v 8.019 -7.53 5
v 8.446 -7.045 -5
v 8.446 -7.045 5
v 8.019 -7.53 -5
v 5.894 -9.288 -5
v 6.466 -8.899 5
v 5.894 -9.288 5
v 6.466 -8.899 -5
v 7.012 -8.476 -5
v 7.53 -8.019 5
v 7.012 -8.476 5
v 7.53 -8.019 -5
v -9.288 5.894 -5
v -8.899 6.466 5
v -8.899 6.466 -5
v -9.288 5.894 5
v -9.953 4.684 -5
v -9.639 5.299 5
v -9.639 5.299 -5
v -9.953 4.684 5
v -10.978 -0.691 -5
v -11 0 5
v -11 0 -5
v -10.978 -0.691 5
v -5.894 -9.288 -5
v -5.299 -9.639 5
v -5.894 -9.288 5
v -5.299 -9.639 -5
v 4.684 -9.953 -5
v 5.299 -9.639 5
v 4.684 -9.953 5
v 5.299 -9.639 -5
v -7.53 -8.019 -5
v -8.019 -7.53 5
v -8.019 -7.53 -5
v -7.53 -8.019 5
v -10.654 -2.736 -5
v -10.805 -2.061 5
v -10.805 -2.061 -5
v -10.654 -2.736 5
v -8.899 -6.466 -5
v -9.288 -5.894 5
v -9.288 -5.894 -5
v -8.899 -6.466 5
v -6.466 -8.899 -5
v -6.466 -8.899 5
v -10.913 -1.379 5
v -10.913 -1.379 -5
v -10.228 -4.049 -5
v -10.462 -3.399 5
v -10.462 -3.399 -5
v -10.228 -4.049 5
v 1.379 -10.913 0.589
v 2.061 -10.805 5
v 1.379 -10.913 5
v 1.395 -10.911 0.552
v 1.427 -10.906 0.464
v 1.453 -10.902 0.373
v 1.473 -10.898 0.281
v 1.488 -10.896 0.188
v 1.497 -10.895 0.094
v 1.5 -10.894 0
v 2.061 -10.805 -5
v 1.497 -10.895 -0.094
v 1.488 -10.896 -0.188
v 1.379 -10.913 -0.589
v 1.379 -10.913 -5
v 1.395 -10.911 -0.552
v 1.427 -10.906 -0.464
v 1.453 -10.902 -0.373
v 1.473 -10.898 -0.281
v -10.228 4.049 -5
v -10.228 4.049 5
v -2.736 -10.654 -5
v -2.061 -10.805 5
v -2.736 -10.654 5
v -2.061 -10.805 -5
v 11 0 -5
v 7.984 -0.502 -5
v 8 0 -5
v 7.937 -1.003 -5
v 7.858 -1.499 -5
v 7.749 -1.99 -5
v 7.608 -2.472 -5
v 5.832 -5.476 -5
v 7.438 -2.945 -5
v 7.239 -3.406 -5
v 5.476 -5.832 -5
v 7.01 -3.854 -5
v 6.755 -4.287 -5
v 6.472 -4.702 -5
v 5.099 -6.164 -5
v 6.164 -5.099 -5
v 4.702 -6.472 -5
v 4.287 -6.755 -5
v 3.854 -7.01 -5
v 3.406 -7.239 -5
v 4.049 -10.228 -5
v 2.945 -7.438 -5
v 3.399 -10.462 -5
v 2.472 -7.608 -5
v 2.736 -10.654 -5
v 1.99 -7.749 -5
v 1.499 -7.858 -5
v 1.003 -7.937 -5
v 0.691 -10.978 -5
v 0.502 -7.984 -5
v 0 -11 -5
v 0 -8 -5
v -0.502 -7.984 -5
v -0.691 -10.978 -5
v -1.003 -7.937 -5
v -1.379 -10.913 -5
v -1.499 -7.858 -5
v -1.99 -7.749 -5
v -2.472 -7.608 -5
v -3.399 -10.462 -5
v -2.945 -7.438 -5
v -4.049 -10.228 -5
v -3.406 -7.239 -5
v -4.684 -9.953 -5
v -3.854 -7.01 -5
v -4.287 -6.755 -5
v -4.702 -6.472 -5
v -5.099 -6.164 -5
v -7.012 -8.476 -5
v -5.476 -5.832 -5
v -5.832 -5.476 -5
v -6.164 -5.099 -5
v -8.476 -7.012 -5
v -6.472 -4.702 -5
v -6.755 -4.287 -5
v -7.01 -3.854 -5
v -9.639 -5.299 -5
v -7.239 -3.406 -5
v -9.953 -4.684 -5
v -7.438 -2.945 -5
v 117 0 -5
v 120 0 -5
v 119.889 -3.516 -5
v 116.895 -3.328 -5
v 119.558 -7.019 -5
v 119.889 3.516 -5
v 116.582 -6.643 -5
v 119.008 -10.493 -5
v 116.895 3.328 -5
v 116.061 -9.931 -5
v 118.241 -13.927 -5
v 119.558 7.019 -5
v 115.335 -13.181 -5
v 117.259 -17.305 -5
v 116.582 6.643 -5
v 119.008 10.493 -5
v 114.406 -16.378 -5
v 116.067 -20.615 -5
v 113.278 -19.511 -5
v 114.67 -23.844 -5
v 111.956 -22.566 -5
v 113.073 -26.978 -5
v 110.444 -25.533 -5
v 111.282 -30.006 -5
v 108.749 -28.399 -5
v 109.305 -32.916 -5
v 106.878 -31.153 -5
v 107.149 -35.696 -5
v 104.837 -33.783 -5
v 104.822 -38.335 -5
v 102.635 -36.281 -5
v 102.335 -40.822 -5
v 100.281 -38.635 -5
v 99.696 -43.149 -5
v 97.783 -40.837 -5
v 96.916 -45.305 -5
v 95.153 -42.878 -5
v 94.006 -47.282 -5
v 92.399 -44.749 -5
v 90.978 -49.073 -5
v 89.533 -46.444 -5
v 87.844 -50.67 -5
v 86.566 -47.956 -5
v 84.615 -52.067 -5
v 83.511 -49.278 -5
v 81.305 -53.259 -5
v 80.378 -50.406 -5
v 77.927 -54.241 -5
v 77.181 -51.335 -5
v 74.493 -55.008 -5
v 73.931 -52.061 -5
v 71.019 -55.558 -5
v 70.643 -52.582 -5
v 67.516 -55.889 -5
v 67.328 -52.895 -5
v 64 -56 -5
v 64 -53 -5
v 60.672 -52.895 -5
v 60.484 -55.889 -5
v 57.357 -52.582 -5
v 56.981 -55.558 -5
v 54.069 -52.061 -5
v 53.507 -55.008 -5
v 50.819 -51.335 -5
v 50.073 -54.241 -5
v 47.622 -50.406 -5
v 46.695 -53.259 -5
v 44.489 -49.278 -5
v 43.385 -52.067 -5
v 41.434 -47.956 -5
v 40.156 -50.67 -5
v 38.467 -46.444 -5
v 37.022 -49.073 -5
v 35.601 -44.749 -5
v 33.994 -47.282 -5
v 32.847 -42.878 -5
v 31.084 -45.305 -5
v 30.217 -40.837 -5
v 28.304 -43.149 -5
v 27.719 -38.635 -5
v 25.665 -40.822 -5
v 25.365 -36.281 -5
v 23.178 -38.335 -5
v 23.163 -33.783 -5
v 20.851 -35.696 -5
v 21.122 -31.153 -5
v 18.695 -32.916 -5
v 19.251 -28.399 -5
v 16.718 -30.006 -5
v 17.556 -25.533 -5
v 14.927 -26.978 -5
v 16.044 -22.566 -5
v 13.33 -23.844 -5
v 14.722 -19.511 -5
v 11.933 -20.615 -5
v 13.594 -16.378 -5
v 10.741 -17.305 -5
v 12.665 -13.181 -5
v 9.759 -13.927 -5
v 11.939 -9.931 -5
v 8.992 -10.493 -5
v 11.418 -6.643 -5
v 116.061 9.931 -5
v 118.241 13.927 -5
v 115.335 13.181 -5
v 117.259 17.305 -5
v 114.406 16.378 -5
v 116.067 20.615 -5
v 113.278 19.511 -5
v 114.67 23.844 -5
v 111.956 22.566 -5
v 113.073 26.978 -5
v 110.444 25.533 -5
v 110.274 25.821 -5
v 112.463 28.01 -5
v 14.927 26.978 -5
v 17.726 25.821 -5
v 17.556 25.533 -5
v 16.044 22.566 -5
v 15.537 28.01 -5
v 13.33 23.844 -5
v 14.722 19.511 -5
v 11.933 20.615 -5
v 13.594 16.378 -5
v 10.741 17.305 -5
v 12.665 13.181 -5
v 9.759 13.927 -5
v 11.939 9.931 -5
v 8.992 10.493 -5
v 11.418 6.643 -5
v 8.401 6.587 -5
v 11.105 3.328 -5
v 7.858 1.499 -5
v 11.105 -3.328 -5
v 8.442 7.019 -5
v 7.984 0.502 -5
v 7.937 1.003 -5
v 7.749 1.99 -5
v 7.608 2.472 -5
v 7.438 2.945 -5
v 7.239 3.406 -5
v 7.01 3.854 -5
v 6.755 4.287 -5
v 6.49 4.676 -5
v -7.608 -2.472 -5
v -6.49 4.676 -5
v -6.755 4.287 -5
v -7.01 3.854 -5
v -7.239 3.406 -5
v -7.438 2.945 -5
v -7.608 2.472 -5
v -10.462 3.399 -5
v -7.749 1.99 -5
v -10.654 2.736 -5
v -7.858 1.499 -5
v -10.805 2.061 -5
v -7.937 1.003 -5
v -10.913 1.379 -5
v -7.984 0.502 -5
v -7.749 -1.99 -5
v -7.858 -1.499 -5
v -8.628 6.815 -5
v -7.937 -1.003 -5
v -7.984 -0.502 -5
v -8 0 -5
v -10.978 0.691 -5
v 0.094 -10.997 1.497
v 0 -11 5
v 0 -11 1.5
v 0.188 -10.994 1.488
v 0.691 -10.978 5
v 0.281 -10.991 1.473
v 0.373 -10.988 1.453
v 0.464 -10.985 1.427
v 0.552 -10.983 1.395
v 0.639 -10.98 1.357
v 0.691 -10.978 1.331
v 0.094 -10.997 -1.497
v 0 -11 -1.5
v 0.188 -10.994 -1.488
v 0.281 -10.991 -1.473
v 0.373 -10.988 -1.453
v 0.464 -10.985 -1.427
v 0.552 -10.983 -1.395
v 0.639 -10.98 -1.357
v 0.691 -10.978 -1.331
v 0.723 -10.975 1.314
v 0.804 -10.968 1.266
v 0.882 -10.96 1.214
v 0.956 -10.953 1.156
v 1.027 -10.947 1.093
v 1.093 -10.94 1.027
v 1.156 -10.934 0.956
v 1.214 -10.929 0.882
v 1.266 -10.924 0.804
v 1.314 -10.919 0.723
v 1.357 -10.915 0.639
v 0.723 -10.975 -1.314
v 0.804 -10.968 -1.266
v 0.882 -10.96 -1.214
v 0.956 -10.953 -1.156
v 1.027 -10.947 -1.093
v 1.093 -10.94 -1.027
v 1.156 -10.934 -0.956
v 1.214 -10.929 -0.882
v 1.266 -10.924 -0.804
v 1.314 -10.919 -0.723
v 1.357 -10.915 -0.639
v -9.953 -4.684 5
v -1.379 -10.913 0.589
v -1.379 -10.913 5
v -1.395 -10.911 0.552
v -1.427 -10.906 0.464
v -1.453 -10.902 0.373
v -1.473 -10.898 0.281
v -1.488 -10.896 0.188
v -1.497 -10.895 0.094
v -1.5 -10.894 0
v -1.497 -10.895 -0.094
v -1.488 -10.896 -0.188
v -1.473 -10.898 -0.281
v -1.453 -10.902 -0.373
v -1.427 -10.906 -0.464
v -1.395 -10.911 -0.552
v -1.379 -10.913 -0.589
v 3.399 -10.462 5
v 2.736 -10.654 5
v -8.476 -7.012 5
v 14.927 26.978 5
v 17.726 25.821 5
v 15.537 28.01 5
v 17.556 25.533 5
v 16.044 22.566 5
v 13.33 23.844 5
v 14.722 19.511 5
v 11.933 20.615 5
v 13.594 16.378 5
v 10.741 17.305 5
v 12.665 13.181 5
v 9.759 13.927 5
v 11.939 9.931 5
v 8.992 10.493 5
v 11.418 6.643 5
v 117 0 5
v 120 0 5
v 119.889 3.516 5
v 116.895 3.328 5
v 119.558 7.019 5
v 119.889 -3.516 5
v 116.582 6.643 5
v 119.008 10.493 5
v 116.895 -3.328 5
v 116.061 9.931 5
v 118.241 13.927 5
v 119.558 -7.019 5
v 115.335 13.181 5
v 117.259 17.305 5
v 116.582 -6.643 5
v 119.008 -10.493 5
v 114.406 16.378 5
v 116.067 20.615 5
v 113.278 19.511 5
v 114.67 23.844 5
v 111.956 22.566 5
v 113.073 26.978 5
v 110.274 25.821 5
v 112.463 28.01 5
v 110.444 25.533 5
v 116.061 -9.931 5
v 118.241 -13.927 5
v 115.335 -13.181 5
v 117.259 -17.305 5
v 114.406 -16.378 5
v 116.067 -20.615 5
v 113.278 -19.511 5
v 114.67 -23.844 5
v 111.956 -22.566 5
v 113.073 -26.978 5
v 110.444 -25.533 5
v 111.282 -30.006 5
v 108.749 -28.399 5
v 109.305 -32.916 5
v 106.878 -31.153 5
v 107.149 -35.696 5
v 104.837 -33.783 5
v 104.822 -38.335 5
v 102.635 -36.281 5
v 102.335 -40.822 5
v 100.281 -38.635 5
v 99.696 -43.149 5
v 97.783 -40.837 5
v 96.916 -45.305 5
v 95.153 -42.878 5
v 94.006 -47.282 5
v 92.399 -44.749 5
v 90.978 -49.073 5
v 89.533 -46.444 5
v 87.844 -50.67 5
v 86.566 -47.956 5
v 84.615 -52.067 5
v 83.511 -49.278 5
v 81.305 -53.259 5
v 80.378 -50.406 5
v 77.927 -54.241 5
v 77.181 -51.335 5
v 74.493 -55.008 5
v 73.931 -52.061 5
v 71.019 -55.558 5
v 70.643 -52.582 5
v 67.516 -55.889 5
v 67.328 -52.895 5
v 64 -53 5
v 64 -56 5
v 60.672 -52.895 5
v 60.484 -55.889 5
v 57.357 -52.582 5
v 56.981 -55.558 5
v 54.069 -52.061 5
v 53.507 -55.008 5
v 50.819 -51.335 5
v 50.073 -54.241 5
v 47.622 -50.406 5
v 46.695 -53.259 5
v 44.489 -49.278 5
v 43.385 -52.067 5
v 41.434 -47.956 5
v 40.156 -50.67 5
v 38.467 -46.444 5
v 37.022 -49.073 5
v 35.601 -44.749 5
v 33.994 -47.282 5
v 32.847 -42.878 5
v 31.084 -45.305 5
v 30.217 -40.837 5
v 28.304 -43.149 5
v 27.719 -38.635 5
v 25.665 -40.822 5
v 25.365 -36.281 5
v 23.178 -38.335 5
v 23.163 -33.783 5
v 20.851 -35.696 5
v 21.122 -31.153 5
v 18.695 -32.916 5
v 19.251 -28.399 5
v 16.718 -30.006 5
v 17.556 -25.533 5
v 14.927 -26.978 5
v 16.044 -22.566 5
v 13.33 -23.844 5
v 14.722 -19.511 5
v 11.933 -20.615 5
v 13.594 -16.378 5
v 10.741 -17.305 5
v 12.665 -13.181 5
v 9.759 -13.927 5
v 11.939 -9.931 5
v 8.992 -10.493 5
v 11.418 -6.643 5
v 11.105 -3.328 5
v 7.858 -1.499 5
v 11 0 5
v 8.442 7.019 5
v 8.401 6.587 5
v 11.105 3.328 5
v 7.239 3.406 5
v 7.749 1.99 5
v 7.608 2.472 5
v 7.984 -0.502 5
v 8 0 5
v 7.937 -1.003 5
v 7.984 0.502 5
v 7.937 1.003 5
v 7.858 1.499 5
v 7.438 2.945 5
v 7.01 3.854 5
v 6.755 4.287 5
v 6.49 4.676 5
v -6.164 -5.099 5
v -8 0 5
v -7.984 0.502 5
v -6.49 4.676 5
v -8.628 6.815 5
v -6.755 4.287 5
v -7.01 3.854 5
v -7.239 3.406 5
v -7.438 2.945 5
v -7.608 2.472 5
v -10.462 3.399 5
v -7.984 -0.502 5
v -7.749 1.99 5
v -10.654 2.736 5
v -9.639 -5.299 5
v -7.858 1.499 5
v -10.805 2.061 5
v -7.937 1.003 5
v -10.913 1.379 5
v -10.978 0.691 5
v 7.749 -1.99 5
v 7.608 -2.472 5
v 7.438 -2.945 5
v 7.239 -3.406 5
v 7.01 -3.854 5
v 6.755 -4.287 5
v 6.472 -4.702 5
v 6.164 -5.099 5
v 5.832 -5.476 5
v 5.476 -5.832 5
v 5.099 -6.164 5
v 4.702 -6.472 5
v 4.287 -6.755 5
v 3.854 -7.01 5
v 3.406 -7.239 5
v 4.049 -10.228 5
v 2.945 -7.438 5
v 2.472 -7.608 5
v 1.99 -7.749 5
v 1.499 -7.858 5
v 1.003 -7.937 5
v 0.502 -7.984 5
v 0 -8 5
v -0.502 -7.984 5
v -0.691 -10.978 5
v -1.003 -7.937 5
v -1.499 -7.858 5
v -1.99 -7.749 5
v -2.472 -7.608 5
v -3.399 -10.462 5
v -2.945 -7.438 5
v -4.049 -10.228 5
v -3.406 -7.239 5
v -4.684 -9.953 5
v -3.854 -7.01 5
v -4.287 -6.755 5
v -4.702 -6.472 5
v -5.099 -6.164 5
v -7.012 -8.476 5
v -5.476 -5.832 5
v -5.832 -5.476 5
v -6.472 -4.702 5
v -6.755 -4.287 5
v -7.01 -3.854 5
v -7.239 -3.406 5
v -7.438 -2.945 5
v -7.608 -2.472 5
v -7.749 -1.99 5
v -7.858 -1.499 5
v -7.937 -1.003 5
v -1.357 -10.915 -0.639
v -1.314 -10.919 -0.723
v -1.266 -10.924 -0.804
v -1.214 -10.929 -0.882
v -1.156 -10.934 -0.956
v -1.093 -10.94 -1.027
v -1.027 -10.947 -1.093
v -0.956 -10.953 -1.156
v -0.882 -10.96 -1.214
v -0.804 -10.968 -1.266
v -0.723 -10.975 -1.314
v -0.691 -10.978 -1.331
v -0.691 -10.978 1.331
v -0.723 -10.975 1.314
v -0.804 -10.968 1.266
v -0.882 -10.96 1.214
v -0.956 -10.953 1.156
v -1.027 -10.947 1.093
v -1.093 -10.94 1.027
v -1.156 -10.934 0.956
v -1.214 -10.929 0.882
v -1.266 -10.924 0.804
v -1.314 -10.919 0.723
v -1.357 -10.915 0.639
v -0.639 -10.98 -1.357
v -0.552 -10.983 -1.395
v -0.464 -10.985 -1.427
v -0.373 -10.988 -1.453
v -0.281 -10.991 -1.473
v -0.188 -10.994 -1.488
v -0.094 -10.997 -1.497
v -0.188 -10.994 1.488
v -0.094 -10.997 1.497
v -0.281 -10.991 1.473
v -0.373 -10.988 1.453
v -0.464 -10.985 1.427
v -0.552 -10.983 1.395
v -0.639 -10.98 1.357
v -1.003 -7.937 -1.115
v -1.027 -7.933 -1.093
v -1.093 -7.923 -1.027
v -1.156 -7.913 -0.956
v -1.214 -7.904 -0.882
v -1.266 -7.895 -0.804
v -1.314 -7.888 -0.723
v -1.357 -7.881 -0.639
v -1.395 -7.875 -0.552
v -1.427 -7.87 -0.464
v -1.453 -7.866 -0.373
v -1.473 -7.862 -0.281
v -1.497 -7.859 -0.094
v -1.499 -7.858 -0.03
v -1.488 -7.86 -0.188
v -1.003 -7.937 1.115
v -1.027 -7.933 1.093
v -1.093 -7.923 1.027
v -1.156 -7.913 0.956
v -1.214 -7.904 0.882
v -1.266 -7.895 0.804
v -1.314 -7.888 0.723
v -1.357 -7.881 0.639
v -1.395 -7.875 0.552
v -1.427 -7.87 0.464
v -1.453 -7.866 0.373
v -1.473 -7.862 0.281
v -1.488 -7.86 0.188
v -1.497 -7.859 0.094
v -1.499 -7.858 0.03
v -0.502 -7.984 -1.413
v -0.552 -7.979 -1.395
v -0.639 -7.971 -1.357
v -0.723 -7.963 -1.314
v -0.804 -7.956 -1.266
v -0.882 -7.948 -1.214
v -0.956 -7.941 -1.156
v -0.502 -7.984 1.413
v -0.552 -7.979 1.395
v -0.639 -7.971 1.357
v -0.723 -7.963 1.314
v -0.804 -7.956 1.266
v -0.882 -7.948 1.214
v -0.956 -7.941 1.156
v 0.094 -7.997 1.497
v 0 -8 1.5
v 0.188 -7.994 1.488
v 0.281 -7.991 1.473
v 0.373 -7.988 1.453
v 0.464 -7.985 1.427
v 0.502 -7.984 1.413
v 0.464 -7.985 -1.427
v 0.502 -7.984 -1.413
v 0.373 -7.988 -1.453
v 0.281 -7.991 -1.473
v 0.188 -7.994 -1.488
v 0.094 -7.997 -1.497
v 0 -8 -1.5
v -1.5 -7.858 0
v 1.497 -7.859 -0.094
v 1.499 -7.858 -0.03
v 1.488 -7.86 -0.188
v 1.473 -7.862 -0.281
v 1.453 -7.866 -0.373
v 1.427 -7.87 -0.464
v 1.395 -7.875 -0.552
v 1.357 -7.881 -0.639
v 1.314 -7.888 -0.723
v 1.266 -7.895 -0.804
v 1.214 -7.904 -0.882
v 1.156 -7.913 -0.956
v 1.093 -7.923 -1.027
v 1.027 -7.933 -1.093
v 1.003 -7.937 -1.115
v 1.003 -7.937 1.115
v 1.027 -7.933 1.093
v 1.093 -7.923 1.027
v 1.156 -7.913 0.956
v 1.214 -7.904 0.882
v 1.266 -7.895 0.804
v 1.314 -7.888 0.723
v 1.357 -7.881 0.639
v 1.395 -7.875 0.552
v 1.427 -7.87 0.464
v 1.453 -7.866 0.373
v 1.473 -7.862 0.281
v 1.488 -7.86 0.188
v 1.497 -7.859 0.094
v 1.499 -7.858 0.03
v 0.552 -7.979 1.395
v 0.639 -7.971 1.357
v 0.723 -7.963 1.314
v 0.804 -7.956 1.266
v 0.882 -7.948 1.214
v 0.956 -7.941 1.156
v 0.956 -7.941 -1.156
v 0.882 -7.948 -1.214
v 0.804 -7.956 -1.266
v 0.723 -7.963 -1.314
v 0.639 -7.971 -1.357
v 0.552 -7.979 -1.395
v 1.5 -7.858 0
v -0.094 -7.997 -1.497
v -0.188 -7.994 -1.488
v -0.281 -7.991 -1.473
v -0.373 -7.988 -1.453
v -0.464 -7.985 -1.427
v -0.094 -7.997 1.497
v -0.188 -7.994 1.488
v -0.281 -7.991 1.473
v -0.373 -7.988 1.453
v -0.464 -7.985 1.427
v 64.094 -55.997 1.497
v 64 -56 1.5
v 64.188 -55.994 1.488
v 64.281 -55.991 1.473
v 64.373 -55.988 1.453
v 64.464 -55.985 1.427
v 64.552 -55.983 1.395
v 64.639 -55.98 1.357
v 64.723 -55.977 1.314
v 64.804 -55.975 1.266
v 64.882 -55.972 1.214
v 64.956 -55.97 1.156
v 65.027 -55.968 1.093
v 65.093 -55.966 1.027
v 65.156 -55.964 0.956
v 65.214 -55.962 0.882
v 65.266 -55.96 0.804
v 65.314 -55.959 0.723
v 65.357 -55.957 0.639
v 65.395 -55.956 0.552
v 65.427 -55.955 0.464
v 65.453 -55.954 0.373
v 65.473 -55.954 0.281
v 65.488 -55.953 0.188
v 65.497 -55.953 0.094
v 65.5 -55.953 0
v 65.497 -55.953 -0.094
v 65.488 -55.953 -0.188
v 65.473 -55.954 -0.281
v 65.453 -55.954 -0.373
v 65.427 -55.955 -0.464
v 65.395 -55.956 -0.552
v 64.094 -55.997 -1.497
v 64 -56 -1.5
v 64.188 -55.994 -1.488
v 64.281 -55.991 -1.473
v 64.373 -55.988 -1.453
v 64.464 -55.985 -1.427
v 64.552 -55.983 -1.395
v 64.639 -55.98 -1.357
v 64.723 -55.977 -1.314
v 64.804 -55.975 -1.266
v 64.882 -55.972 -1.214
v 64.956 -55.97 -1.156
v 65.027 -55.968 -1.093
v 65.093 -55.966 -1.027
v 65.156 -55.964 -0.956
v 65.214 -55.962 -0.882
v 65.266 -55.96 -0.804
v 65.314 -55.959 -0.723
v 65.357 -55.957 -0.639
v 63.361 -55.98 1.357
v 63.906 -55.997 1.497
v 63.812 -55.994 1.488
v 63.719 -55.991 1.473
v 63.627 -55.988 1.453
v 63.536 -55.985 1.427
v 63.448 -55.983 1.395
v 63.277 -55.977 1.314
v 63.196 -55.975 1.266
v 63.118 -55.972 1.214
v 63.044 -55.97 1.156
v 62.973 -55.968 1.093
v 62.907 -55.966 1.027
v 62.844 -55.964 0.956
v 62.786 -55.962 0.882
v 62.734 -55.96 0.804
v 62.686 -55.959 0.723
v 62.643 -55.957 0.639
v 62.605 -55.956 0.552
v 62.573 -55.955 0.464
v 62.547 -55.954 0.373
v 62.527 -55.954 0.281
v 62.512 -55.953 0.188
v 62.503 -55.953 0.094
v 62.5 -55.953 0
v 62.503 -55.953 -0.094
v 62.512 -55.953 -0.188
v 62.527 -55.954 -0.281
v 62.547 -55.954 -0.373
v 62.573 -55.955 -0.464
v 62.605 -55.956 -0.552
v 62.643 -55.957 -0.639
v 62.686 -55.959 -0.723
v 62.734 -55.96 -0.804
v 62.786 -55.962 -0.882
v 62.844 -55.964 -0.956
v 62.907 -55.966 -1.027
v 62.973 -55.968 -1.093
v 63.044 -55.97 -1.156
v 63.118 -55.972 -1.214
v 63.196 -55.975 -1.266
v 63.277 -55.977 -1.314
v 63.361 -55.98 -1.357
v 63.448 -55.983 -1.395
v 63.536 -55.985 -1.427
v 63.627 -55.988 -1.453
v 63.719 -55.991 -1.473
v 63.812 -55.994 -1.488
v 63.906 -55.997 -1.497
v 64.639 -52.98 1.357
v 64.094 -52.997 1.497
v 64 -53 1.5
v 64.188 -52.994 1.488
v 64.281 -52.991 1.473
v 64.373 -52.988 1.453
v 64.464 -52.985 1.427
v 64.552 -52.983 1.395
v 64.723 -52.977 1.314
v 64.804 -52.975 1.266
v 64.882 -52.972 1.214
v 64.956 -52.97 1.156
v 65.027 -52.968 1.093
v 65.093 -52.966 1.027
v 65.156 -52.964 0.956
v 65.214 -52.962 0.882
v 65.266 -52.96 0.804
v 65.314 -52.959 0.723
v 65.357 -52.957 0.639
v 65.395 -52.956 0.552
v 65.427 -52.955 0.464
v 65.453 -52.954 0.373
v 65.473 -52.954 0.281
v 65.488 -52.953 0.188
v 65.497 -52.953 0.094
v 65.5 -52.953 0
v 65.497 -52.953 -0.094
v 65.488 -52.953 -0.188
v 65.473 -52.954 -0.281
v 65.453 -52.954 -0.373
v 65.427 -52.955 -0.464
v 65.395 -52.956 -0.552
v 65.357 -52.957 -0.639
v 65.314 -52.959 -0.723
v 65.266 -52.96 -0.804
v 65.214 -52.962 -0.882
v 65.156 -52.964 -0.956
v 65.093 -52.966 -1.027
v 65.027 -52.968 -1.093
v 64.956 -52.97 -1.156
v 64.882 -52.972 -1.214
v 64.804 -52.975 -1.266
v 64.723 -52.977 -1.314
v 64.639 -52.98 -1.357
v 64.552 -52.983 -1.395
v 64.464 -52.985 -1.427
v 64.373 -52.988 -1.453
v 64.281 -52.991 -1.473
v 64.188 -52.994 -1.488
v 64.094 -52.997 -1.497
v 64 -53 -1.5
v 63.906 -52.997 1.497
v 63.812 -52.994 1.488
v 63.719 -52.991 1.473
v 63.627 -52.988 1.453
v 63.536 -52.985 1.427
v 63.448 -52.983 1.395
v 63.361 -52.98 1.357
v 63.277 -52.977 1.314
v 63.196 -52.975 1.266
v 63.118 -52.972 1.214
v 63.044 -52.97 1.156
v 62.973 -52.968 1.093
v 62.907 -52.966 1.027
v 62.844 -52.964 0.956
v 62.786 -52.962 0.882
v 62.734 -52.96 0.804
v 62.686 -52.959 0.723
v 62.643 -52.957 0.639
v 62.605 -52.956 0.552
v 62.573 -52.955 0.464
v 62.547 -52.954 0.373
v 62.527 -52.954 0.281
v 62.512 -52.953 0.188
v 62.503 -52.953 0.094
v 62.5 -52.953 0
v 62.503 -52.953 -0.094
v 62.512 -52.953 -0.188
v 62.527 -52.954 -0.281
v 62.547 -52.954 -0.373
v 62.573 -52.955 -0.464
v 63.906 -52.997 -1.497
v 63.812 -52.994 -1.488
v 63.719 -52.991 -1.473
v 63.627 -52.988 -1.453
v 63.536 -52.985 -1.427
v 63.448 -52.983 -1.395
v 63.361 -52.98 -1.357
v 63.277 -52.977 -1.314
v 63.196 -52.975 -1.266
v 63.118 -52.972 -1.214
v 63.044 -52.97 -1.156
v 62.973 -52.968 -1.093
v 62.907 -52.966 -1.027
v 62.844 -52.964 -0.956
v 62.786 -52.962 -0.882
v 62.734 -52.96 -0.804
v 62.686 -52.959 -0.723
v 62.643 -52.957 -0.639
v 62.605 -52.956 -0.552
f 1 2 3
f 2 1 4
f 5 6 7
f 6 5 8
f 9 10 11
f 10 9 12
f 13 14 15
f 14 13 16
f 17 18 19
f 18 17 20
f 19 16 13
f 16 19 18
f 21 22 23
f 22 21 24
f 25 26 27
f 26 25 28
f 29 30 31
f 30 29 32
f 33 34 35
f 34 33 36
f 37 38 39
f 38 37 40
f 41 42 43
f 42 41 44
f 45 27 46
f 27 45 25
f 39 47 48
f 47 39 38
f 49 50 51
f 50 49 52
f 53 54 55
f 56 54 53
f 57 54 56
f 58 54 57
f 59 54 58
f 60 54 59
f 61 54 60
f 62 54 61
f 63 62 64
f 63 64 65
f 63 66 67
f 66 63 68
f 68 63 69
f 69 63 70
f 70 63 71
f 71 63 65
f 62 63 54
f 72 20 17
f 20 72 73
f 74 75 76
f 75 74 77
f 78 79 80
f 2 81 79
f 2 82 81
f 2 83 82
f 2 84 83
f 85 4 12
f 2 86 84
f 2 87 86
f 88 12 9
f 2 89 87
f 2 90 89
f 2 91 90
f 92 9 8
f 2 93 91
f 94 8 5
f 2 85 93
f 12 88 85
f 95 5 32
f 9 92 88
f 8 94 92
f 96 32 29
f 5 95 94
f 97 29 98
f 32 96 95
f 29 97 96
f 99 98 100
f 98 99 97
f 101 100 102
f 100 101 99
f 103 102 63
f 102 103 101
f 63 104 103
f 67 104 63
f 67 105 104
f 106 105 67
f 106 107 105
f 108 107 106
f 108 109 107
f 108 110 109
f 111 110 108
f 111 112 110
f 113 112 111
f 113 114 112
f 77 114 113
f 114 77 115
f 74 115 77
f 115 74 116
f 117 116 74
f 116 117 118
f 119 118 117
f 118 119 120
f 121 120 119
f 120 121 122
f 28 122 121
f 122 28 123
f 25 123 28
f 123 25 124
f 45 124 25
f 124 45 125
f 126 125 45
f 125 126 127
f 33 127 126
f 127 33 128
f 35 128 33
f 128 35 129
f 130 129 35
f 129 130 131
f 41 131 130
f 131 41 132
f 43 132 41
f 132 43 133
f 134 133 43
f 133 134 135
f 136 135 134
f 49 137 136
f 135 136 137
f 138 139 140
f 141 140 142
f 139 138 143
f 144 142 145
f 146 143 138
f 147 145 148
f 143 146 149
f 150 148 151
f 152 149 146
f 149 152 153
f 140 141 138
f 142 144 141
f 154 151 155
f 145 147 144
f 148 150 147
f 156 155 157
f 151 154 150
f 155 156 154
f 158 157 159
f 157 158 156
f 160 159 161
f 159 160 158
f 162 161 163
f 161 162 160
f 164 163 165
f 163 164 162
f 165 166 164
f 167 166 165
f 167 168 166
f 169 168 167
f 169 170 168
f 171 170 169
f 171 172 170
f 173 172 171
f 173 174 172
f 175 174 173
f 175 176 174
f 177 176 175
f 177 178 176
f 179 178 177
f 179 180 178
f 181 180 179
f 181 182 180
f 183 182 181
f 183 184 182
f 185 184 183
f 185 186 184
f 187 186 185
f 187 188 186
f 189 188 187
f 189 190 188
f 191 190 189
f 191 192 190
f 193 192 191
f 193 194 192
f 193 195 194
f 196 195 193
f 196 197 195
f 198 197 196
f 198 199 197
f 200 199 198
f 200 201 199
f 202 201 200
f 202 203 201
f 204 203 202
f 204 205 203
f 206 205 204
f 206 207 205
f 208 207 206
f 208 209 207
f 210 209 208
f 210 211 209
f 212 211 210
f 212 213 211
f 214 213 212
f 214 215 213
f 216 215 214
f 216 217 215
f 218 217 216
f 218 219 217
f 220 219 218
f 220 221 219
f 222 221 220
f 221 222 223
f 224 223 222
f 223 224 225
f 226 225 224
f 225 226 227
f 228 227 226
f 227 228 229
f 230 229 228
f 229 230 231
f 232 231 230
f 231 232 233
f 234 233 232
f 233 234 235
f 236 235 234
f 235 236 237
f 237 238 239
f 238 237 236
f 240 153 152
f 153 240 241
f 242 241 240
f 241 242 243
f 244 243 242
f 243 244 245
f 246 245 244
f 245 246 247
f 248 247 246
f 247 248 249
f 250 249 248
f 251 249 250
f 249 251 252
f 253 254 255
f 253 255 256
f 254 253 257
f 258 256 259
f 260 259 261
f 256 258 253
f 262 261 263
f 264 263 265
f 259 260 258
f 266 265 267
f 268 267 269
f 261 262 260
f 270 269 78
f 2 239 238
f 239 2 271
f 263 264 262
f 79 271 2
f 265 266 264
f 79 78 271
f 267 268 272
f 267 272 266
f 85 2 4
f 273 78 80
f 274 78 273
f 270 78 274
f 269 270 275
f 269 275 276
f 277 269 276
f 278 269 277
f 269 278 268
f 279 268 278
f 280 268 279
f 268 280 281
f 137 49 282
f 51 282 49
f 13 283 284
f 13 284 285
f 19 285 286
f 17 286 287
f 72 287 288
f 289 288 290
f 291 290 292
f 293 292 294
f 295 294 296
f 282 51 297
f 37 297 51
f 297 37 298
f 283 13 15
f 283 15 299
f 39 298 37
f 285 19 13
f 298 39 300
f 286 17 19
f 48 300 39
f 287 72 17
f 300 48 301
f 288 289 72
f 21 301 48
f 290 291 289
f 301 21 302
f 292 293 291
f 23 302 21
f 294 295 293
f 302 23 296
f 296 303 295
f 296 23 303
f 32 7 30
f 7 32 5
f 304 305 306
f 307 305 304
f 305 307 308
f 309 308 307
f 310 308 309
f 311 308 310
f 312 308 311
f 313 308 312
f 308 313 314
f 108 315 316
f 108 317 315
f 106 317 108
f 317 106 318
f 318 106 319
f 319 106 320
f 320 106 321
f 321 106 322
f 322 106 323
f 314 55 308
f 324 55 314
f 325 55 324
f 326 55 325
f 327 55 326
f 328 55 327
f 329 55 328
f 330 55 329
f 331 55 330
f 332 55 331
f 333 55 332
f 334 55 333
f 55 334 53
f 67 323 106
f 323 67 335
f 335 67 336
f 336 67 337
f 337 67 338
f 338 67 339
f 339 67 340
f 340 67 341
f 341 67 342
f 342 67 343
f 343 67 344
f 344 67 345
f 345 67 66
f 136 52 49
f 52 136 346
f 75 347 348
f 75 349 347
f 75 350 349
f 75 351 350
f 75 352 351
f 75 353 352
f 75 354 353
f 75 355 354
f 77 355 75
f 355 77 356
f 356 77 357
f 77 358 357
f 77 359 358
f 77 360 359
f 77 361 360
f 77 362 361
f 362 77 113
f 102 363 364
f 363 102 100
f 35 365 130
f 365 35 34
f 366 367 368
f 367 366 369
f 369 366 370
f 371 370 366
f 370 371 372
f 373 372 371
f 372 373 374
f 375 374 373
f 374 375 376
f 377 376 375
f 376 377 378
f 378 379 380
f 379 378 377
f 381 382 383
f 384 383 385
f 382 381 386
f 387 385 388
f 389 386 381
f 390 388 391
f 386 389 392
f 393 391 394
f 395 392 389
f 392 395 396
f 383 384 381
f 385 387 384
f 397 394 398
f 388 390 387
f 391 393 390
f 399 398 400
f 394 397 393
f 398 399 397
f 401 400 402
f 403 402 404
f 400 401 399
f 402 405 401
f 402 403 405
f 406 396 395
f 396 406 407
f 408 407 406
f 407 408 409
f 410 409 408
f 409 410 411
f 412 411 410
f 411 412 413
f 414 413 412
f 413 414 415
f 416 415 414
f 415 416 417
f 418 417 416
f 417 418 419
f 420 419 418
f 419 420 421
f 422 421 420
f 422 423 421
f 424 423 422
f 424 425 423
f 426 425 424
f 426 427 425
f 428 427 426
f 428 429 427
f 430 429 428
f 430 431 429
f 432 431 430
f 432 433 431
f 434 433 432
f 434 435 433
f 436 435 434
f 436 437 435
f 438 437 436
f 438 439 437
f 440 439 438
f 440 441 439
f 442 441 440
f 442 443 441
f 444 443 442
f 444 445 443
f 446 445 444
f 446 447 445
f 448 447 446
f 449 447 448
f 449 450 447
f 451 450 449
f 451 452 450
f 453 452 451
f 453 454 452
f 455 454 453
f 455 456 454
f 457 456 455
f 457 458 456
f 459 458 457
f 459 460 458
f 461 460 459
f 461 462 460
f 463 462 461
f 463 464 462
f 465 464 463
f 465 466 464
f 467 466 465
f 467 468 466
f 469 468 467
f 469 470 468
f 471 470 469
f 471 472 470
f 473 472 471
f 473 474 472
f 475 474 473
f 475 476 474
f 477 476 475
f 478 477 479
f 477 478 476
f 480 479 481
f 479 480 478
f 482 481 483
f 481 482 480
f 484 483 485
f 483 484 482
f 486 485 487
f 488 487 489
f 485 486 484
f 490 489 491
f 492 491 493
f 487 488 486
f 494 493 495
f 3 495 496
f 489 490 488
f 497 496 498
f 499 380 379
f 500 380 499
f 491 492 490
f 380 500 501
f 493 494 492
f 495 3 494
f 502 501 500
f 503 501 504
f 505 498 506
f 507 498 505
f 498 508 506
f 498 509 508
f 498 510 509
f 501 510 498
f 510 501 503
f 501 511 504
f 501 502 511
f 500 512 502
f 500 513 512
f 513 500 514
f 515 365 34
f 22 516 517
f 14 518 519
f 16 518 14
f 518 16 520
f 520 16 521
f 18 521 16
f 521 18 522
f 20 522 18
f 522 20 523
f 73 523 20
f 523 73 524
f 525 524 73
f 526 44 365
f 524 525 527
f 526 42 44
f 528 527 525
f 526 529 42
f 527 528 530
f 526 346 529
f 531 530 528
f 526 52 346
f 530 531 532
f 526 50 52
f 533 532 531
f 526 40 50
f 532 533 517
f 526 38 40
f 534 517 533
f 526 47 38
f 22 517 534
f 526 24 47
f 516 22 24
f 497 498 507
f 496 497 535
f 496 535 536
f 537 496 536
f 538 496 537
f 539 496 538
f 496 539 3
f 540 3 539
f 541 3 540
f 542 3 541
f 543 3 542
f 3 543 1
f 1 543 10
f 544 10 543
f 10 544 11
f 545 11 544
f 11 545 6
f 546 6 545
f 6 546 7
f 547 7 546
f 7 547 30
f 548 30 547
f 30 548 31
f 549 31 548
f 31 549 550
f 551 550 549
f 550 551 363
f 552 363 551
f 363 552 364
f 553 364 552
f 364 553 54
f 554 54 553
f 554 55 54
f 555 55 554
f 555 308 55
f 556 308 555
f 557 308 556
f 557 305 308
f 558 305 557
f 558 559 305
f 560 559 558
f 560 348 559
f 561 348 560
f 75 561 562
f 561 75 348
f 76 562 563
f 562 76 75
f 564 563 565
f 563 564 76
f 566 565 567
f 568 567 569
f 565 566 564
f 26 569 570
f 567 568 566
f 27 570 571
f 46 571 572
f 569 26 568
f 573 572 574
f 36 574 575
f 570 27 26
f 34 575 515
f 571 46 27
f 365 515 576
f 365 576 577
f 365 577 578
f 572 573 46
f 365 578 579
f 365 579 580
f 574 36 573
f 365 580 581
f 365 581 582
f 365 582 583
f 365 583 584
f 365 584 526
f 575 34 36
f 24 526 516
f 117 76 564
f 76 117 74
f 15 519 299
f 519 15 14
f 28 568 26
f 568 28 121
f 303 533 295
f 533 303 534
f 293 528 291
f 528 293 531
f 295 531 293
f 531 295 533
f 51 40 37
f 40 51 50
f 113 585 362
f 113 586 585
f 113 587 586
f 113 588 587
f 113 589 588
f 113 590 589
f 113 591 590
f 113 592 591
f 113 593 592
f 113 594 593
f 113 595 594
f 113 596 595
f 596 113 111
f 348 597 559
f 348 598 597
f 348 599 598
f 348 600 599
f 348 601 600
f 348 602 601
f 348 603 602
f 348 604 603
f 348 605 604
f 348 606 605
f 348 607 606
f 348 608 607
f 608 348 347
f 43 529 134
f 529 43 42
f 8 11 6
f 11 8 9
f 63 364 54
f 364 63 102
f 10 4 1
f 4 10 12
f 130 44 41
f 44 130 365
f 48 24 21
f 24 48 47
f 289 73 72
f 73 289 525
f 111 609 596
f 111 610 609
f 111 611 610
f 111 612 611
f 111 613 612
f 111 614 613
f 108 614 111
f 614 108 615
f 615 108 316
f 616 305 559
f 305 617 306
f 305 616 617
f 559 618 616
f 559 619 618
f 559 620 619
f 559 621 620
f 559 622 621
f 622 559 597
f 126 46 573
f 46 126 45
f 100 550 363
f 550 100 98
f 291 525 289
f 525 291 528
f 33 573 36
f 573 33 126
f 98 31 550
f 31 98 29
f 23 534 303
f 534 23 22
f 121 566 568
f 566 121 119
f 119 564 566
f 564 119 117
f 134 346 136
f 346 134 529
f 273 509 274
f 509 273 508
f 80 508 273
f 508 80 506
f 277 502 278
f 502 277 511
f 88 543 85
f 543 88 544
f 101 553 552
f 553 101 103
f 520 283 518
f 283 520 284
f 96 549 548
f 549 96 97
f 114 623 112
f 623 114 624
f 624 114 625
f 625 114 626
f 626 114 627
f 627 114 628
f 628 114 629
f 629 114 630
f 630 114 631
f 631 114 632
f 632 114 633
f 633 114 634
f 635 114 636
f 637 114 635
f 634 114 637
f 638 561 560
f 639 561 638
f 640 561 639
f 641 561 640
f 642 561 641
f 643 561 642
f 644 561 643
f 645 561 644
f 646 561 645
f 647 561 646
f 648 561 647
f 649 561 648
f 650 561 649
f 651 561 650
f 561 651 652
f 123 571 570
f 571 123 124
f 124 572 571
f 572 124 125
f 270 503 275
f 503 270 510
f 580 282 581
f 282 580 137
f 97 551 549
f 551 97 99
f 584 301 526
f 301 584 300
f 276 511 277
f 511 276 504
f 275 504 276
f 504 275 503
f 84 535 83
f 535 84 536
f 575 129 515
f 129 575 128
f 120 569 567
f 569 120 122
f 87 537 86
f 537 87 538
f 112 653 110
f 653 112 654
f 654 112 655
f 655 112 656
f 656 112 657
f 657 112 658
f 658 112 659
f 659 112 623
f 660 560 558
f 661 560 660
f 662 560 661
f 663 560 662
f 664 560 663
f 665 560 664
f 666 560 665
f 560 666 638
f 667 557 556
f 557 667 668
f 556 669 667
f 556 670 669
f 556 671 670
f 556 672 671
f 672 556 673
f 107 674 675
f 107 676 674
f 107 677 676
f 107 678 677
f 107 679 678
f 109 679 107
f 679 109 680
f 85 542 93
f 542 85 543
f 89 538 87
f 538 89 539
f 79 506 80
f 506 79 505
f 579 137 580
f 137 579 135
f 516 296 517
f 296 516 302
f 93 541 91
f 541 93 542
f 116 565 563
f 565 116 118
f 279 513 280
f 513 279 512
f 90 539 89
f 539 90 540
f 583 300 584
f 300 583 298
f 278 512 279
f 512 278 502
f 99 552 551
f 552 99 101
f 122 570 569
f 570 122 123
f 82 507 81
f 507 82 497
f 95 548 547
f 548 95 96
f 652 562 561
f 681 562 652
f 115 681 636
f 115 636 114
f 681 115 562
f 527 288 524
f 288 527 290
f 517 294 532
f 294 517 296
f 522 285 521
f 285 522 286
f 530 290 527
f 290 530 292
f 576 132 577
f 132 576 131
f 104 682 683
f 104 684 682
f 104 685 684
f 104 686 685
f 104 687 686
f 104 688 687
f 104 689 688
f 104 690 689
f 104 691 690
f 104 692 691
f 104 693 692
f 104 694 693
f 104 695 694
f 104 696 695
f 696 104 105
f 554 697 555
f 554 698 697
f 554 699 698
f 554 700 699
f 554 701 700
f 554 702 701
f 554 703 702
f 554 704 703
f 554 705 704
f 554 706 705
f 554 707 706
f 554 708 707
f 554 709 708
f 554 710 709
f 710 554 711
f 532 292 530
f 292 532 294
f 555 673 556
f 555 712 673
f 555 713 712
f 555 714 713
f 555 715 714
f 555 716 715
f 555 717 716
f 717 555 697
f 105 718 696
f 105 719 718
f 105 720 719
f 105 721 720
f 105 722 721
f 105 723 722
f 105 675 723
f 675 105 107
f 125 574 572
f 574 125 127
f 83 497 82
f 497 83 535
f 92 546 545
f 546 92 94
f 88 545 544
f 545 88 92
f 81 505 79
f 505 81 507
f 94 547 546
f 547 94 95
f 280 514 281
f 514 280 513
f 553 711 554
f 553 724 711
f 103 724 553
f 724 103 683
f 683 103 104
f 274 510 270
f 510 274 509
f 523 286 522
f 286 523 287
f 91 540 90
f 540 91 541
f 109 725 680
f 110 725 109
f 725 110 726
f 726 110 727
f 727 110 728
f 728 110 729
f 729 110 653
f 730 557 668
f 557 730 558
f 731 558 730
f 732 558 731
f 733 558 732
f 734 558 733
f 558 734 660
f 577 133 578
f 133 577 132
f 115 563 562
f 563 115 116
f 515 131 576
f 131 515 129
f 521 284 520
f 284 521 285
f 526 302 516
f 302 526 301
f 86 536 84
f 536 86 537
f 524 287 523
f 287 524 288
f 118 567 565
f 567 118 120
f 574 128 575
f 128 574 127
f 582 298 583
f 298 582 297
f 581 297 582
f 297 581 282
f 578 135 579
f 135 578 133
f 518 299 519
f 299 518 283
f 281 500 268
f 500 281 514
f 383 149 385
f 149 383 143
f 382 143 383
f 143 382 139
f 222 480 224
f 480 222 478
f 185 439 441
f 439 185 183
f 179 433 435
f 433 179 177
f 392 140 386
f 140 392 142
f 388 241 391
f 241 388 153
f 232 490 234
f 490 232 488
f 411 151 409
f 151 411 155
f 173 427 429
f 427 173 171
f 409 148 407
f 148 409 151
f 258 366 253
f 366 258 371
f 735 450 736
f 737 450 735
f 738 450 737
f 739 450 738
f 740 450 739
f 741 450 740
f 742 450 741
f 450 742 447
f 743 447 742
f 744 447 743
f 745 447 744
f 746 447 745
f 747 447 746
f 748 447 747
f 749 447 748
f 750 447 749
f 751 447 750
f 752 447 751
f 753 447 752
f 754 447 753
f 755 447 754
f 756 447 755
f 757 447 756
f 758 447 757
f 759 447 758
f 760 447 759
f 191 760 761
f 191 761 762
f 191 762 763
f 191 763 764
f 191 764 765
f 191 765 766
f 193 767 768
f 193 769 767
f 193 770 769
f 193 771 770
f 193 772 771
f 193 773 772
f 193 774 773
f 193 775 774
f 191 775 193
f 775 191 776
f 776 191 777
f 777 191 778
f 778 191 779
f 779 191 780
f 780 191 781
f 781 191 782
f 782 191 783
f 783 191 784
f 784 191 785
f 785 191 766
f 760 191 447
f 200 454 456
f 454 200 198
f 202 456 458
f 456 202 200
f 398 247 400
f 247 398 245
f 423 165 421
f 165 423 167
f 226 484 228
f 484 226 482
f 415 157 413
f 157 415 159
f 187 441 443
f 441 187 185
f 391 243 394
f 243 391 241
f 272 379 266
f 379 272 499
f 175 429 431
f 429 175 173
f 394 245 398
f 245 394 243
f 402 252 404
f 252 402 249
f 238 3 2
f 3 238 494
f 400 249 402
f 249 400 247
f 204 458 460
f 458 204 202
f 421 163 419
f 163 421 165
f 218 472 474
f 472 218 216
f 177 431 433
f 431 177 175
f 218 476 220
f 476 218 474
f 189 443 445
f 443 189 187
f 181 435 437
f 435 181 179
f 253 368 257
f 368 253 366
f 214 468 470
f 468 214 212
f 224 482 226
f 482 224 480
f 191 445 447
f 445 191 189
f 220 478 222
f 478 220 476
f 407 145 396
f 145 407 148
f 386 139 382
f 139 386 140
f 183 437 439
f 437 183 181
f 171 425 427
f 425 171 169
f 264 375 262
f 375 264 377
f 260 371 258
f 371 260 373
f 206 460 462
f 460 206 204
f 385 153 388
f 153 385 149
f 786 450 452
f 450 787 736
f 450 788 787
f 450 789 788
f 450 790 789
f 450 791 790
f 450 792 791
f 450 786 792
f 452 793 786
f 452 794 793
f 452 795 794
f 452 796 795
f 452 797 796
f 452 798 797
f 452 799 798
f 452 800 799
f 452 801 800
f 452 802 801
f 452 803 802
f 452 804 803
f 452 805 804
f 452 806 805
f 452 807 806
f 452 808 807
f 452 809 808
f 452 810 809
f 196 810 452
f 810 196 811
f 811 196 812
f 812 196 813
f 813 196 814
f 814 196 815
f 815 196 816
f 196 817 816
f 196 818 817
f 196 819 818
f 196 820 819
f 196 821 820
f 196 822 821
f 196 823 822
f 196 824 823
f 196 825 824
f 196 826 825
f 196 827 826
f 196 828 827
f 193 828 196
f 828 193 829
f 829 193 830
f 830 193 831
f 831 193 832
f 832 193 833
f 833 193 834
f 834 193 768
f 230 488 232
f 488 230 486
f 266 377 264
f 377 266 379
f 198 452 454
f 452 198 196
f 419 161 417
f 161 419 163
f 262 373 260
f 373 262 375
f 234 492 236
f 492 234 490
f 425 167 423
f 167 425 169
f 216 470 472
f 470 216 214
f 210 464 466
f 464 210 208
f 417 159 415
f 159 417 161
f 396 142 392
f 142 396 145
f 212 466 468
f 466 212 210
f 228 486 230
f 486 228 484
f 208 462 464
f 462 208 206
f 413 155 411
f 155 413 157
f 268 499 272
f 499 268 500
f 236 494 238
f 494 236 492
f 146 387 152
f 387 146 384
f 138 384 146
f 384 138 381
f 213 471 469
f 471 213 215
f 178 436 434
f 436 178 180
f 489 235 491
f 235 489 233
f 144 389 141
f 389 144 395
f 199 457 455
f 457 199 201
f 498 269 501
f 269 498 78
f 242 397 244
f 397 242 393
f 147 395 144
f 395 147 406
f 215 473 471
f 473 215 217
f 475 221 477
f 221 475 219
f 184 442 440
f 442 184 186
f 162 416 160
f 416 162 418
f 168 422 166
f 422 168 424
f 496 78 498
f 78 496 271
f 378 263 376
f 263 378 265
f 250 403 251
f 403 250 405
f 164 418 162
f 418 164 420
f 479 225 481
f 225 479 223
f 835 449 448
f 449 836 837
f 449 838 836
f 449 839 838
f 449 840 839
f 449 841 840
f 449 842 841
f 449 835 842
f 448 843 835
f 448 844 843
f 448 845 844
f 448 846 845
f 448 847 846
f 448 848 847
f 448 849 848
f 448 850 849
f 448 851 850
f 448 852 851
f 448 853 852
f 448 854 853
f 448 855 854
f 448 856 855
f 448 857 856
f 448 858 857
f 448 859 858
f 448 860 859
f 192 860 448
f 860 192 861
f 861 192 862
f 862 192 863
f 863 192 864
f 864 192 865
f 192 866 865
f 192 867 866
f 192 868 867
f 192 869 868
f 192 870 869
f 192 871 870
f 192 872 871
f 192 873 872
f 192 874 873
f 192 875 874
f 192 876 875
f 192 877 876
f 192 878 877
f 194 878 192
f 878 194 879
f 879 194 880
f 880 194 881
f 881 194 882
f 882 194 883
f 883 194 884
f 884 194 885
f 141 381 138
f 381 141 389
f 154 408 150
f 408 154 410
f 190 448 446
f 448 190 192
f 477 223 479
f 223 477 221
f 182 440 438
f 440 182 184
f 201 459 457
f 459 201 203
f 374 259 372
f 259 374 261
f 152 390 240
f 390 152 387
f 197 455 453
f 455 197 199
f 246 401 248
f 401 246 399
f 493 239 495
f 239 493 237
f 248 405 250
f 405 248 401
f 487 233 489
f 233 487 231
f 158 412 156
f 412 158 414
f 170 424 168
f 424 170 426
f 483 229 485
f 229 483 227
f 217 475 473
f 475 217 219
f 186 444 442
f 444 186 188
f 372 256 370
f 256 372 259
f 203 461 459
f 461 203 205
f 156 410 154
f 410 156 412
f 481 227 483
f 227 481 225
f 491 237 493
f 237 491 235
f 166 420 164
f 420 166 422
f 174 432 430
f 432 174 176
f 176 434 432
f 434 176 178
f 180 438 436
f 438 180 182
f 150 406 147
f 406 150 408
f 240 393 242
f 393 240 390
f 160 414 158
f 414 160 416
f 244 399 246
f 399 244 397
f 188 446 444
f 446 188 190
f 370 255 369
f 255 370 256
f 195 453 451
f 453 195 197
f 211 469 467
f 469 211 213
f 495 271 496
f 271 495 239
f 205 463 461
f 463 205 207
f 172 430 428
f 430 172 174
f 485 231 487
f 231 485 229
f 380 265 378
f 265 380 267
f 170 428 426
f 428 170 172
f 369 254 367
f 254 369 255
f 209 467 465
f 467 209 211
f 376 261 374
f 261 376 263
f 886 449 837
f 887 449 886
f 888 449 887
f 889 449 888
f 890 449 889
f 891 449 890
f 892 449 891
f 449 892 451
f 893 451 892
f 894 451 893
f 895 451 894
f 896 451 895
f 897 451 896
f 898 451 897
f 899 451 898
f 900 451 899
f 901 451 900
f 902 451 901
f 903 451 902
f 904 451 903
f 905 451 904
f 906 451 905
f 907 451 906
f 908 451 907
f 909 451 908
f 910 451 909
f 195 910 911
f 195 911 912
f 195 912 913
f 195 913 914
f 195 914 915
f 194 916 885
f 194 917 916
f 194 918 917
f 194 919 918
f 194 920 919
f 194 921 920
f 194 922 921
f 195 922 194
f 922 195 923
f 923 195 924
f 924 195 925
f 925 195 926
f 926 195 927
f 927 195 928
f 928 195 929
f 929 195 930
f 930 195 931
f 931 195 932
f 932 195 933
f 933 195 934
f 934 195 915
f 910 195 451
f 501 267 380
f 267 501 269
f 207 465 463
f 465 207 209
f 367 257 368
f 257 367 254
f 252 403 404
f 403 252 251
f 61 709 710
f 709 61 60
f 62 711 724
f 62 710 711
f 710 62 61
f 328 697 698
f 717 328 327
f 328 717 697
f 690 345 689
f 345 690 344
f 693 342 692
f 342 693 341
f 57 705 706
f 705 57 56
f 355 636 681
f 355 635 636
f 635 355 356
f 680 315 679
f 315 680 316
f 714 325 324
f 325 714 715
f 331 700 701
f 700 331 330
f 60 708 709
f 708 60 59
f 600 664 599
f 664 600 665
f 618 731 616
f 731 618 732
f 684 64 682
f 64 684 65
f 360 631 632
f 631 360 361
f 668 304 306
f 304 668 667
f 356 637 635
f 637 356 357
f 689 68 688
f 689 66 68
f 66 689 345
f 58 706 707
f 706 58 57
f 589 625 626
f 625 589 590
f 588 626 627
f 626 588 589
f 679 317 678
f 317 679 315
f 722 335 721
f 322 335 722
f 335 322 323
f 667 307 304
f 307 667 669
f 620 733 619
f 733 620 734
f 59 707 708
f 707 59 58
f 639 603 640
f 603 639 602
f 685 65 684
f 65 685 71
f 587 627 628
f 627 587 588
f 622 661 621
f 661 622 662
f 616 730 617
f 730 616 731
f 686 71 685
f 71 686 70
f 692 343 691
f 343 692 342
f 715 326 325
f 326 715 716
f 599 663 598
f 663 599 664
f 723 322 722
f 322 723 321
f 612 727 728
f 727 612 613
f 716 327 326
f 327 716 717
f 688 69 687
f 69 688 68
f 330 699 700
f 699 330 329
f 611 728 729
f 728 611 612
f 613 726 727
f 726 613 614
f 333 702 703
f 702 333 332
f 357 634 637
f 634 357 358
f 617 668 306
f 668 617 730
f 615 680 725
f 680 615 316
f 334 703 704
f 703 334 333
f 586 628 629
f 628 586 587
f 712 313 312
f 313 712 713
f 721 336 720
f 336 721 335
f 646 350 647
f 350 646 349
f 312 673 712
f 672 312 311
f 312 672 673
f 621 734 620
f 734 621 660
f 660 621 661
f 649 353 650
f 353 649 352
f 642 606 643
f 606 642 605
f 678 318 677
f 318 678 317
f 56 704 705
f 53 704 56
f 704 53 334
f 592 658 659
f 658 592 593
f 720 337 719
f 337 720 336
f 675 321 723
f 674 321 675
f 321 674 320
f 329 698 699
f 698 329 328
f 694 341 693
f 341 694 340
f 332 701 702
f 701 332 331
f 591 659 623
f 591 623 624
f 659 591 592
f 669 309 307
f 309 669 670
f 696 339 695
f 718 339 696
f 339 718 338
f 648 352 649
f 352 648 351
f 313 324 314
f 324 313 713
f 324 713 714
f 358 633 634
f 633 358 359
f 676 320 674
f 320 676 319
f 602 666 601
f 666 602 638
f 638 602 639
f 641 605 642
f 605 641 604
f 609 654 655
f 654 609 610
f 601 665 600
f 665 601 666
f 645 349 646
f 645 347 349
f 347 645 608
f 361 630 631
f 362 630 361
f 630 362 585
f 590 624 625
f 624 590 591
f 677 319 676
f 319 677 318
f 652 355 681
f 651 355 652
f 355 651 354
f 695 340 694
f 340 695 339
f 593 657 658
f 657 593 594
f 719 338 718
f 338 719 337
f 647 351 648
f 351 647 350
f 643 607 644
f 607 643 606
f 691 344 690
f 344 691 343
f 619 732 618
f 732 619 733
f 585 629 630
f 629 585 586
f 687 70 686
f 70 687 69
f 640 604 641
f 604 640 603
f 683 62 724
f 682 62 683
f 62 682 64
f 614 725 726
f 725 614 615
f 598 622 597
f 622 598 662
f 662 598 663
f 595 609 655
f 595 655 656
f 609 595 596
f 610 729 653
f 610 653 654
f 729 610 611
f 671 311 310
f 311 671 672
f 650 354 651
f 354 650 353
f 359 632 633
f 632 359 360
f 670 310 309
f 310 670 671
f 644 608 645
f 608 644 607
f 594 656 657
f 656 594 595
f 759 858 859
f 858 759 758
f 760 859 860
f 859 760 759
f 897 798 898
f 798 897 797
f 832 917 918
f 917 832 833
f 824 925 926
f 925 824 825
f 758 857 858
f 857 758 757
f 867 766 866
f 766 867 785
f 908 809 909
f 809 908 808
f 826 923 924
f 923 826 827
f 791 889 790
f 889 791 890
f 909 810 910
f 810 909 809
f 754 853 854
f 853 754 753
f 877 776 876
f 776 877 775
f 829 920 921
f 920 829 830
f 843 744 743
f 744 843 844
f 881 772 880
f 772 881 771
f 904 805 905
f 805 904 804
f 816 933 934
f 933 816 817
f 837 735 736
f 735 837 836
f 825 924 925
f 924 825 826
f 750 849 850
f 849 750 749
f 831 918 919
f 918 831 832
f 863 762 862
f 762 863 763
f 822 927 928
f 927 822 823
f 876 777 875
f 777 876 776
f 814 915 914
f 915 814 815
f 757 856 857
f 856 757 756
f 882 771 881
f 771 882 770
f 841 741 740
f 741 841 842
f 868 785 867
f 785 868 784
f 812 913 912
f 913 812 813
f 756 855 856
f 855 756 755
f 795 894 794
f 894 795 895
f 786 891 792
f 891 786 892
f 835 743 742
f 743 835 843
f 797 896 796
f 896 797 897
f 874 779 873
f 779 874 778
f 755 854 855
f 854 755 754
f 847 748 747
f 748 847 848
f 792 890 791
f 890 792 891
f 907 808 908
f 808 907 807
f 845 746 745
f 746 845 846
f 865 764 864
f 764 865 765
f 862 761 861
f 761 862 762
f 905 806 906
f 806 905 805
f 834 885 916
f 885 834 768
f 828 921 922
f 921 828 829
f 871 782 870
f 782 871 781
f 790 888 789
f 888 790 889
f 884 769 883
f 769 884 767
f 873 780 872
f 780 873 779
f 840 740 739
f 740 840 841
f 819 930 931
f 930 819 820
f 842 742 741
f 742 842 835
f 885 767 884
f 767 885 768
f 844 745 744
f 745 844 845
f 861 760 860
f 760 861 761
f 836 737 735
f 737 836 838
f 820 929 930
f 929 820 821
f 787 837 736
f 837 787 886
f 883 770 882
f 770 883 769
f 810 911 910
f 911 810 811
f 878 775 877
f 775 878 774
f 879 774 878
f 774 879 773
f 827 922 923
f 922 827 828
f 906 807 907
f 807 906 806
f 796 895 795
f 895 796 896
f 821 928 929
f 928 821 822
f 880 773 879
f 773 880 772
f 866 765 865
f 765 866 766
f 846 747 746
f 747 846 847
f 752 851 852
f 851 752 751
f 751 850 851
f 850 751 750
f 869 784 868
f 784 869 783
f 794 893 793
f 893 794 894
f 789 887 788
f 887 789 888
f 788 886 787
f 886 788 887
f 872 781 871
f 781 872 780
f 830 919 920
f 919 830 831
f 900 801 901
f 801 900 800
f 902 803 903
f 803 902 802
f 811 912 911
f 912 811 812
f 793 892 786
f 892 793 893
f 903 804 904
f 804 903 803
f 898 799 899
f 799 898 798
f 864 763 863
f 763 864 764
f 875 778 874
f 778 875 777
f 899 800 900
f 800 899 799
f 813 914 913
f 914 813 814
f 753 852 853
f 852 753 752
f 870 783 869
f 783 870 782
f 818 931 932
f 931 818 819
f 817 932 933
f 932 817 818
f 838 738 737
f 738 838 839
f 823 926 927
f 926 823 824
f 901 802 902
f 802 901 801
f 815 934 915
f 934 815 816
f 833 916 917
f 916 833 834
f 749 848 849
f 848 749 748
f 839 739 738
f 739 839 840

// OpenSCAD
//+------------------------------+
//|OPENSCAD double pipe clamp V2 |
//|      2016 gaziel@gmail.com   |
//|    beerware licence          |
//+------------------------------+  

//first pipe diametre
d1=16; 
//seconde pipe diametre
d2=106; 
//thinkness
ep=3; 
//hight
h=10; 
//if need support
pylone="no"; //[yes,no]
//need hole ?
hole="yes"; //[yes,no]
//hole diametre
dh=3;

$fn=200/2;

difference(){
    union(){
        //creaton des support de tuyaux
        clamp(min(d1,d2));
        translate([((d1+d2)/2)+ep,0,0])clamp(max(d1,d2));
        //creation du module d'accroce a plat
        if (pylone=="yes"){
            pylone(d1,d2);
            translate([(d1+d2)/4,-max(d1/2,d2/2)-ep/2,0])cube([((d1+d2)/2)+(2*ep),ep,h],center=true);
        }
    }       
    //creation des trous 
    if (hole=="yes"){
        rotate([90,0,0])cylinder(d=dh,h=max(d1,d2)*6,center=true);
        translate([((d1+d2)/2)+ep,0,0])rotate([90,0,0])cylinder(d=dh,h=max(d1,d2)*6,center=true);
    }
}

module pylone(dc1,dc2){
    hull(){    
        translate([0,-(min(dc1,dc2)/2)-(ep/2),0]) cube([h,ep,h], center=true);
        translate([0,-(max(dc1,dc2)/2)-ep/2,0]) cube([h+(2*ep),ep,h], center=true);
    }
}

module clamp(dc){
    difference(){
        cylinder(d=dc+ep*2,h=h,center=true);
        cylinder(d=dc,h=h,center=true);
        translate([0,(dc+ep)/2,0])rotate([0,0,45])cube([dc,dc,h],center=true);
    }
}
